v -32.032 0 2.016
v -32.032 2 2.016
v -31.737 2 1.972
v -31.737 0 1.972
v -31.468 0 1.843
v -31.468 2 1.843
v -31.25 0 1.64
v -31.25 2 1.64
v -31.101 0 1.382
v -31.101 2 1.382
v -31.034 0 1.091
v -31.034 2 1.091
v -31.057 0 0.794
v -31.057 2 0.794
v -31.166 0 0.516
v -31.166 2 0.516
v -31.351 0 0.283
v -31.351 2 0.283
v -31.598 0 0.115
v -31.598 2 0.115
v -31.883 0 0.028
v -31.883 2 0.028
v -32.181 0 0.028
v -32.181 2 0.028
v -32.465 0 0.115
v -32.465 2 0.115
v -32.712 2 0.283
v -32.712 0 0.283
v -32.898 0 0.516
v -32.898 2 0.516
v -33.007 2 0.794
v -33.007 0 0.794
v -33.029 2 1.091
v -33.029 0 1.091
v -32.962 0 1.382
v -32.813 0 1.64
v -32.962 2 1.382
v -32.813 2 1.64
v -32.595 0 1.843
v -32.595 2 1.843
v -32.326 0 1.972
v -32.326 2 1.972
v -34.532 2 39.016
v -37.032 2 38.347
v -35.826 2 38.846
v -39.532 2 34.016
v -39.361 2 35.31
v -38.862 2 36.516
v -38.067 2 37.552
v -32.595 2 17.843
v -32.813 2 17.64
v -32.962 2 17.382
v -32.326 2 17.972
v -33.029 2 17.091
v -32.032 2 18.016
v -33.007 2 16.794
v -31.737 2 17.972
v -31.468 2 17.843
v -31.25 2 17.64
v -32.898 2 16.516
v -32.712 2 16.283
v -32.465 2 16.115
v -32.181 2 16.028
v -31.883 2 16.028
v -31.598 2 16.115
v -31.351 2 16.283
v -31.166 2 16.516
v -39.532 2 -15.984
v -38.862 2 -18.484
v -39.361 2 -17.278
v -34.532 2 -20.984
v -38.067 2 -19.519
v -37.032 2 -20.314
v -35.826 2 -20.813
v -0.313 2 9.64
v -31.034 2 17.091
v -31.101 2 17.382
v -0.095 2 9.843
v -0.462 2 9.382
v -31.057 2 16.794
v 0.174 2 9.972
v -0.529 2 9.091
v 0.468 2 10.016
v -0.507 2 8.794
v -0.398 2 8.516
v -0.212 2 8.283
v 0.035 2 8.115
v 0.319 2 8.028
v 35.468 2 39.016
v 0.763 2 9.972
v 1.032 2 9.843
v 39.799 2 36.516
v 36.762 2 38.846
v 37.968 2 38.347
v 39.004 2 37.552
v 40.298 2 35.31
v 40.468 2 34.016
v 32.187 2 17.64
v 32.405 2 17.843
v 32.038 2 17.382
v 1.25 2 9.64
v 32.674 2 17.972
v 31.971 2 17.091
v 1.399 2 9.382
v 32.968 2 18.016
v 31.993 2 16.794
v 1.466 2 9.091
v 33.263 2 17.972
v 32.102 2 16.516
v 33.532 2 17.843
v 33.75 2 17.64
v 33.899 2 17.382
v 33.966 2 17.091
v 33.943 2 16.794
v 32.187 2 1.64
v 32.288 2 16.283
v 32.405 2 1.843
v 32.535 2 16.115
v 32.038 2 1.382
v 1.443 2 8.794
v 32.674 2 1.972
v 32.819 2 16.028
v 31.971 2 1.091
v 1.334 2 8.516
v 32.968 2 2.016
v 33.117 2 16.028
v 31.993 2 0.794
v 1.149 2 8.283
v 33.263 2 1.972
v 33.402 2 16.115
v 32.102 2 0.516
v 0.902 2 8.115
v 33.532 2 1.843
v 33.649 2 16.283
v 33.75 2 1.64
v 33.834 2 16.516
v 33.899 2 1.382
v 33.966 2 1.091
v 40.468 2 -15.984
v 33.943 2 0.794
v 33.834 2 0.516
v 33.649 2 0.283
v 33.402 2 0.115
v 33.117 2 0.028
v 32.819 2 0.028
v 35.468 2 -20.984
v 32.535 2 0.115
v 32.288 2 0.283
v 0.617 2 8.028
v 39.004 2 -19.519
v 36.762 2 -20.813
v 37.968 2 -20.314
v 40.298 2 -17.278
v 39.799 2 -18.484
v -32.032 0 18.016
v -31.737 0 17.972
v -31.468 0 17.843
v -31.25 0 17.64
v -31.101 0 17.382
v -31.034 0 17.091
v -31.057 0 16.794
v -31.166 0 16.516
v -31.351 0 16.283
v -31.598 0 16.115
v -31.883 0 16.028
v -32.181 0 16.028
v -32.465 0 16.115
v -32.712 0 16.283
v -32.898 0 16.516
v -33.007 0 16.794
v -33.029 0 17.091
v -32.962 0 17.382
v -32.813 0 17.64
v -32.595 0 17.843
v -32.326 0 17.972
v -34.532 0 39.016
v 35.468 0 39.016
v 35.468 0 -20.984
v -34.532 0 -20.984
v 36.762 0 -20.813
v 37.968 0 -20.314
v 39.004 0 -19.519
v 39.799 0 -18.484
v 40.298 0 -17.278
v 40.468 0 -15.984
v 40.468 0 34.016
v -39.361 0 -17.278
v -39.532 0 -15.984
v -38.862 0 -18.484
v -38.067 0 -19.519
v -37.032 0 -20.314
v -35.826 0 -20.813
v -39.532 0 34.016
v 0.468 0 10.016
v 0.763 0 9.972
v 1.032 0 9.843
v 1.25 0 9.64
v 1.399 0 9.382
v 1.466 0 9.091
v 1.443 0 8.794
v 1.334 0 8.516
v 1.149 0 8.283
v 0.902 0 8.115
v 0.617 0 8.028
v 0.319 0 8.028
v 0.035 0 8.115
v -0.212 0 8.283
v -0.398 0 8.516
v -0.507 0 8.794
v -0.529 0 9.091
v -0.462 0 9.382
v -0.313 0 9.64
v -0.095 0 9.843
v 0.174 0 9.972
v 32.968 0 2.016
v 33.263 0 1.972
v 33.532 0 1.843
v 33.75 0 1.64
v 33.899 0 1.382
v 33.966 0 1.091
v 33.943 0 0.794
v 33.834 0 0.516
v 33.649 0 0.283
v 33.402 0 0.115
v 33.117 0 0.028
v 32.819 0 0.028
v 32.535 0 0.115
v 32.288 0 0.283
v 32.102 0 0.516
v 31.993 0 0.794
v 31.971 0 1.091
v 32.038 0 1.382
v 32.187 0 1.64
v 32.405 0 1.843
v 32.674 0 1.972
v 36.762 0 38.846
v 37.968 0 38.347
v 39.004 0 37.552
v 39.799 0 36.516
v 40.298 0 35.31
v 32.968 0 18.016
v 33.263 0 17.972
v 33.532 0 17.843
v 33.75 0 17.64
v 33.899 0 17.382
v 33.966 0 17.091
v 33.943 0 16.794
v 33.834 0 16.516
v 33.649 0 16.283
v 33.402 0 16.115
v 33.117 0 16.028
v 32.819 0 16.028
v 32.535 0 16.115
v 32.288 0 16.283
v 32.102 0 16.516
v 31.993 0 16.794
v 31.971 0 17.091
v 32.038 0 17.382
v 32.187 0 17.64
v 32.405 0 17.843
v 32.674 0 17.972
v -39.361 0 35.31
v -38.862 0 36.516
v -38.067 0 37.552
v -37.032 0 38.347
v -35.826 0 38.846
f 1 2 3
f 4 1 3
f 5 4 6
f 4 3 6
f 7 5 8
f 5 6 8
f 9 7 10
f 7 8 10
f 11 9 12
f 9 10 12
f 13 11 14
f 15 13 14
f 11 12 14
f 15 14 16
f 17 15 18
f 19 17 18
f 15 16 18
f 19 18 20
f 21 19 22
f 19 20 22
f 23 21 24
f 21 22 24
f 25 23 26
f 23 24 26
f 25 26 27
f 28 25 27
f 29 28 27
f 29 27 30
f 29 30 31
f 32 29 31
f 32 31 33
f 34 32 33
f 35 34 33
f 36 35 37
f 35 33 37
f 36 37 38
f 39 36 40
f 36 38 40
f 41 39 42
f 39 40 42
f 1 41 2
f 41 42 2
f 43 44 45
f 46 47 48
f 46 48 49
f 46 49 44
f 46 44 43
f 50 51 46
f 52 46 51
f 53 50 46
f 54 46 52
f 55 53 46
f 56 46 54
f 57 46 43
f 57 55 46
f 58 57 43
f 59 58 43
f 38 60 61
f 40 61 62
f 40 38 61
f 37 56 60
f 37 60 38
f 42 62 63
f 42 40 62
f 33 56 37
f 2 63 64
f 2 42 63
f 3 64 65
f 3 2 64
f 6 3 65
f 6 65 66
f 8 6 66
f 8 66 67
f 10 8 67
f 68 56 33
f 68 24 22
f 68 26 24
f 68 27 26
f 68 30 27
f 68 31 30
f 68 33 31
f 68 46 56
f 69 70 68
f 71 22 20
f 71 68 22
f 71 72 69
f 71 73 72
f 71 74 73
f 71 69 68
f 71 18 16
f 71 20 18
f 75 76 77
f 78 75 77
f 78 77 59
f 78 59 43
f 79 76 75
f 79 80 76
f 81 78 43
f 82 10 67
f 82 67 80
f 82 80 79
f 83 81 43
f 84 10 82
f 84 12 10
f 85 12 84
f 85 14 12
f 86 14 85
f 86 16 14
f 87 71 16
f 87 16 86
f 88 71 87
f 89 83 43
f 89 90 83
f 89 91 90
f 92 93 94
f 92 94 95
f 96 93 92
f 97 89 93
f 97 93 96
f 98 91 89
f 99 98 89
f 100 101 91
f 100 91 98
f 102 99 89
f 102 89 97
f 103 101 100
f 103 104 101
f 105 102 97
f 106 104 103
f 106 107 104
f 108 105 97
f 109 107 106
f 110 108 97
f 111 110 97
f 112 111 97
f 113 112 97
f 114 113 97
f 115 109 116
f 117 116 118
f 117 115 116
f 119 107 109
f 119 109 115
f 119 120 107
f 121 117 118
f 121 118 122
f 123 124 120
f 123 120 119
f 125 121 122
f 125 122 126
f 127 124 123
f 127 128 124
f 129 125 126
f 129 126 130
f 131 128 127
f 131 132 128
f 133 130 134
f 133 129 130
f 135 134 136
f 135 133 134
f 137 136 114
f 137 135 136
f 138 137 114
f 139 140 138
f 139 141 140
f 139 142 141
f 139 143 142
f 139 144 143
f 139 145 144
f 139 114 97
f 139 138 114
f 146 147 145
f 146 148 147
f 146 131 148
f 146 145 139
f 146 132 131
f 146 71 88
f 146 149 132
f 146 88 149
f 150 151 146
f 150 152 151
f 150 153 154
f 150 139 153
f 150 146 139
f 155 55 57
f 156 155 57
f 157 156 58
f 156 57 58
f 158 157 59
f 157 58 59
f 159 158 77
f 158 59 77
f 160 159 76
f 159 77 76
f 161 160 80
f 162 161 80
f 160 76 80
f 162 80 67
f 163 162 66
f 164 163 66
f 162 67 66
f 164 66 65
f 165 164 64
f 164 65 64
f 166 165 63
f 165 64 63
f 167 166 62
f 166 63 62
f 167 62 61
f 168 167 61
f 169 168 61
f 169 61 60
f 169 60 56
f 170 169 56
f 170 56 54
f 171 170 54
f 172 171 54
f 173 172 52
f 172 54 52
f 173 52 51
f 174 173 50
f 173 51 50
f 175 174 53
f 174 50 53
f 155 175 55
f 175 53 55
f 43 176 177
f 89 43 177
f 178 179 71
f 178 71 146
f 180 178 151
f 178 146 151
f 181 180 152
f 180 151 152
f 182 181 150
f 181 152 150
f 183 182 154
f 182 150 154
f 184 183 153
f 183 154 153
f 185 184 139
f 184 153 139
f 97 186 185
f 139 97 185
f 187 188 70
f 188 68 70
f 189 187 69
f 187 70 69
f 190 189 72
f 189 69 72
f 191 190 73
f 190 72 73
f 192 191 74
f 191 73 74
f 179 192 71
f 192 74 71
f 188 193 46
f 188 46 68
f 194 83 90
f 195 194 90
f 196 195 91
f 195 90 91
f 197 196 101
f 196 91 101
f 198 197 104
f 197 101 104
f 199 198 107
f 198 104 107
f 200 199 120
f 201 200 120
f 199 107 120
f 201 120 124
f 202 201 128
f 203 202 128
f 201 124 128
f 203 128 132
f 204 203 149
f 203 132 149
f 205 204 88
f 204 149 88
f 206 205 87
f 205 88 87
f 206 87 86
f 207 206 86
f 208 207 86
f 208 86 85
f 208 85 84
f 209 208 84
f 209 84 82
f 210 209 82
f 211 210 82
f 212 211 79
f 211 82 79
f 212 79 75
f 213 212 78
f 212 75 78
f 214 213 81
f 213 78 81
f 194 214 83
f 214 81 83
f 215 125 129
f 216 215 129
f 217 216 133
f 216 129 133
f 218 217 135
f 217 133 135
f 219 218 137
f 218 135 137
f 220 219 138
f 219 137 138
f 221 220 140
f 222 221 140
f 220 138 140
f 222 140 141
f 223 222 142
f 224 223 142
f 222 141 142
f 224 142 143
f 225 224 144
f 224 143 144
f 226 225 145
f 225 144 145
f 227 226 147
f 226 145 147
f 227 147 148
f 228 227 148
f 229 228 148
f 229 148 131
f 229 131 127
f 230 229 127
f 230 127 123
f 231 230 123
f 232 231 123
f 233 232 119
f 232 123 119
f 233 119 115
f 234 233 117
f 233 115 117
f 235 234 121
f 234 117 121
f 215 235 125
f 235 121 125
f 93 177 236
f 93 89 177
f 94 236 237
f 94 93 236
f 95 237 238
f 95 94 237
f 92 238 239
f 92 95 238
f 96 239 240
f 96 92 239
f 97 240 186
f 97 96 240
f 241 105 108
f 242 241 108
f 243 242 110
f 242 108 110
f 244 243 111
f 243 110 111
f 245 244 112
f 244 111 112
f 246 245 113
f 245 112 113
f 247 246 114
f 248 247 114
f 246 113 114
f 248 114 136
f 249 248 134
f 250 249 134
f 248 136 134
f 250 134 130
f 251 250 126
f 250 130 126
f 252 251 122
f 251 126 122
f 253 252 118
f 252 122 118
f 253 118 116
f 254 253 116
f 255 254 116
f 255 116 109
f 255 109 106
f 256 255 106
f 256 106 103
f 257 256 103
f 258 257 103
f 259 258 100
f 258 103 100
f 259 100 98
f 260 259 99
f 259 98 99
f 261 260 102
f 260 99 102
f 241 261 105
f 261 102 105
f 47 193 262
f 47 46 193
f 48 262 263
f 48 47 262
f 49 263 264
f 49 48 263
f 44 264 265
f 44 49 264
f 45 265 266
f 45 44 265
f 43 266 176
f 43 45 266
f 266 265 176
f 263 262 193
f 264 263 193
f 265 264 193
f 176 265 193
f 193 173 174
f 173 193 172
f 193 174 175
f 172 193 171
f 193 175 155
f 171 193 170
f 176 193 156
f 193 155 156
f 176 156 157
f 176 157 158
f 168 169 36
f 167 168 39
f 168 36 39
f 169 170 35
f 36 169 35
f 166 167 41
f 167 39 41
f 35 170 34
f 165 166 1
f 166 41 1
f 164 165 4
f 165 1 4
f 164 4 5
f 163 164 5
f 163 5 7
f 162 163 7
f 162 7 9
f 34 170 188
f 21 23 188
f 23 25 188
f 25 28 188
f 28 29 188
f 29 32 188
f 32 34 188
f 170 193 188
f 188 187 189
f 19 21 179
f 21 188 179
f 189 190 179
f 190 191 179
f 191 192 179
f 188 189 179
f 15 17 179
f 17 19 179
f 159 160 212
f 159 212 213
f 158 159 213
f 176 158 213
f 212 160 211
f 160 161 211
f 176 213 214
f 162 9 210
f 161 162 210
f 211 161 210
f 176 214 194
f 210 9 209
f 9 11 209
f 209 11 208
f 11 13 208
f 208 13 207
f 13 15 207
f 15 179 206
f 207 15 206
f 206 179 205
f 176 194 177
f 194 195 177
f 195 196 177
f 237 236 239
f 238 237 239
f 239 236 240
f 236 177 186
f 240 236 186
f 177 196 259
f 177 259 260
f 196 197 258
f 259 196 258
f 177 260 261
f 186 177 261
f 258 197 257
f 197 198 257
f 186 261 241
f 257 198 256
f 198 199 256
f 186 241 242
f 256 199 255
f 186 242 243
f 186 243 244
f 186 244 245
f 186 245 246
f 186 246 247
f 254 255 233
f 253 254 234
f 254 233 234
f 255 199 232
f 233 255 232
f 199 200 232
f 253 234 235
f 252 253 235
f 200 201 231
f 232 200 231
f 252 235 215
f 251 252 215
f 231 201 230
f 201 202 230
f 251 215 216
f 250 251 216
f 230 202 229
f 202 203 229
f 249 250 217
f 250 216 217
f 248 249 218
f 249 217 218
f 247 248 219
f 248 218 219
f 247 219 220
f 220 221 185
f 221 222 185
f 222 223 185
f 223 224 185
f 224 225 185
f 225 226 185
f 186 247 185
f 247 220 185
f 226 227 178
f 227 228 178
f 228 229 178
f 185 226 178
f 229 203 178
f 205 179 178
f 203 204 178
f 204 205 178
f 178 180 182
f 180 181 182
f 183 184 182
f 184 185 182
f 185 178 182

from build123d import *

# Parameters (mm, degrees)
SKETCH1_W           = 80
SKETCH1_H           = 60
BOSS_EXTRUDE2_DEPTH = 2
SKETCH3_R           = 1
CUT_EXTRUDE2_DEPTH  = 2
FILLET2_R           = 5


with BuildPart() as part:
    # Sketch1 → Boss-Extrude2 (new body)
    with BuildSketch(Plane(origin=(0, 0, 0), x_dir=(1, 0, 0), z_dir=(0, 1, 0))):
        with Locations((0.468384075, -9.016393443)):
            Rectangle(SKETCH1_W, SKETCH1_H)
    extrude(amount=BOSS_EXTRUDE2_DEPTH)

    # Sketch3 → Cut-Extrude2 (cut)
    with BuildSketch(Plane(origin=(0, 2, 0), x_dir=(1, 0, 0), z_dir=(0, 1, 0))):
        with Locations(Location((-32.031615925, -1.016393443, 0), (0, 0, 270))):
            Circle(SKETCH3_R)
        with Locations(Location((-32.031615925, -17.016393443, 0), (0, 0, 270))):
            Circle(SKETCH3_R)
        with Locations(Location((32.968384075, -1.016393443, 0), (0, 0, 270))):
            Circle(SKETCH3_R)
        with Locations(Location((32.968384075, -17.016393443, 0), (0, 0, 270))):
            Circle(SKETCH3_R)
        with Locations(Location((0.468384075, -9.016393443, 0), (0, 0, 270))):
            Circle(SKETCH3_R)
    extrude(amount=-CUT_EXTRUDE2_DEPTH, mode=Mode.SUBTRACT)

    # Fillet2
    fillet2_edges = [part.edges().sort_by_distance(p)[0] for p in [
        (-39.531615925, 1, -20.983606557),
        (40.468384075, 1, -20.983606557),
        (40.468384075, 1, 39.016393443),
        (-39.531615925, 1, 39.016393443),
    ]]
    fillet(fillet2_edges, radius=FILLET2_R)


solid = part.part
